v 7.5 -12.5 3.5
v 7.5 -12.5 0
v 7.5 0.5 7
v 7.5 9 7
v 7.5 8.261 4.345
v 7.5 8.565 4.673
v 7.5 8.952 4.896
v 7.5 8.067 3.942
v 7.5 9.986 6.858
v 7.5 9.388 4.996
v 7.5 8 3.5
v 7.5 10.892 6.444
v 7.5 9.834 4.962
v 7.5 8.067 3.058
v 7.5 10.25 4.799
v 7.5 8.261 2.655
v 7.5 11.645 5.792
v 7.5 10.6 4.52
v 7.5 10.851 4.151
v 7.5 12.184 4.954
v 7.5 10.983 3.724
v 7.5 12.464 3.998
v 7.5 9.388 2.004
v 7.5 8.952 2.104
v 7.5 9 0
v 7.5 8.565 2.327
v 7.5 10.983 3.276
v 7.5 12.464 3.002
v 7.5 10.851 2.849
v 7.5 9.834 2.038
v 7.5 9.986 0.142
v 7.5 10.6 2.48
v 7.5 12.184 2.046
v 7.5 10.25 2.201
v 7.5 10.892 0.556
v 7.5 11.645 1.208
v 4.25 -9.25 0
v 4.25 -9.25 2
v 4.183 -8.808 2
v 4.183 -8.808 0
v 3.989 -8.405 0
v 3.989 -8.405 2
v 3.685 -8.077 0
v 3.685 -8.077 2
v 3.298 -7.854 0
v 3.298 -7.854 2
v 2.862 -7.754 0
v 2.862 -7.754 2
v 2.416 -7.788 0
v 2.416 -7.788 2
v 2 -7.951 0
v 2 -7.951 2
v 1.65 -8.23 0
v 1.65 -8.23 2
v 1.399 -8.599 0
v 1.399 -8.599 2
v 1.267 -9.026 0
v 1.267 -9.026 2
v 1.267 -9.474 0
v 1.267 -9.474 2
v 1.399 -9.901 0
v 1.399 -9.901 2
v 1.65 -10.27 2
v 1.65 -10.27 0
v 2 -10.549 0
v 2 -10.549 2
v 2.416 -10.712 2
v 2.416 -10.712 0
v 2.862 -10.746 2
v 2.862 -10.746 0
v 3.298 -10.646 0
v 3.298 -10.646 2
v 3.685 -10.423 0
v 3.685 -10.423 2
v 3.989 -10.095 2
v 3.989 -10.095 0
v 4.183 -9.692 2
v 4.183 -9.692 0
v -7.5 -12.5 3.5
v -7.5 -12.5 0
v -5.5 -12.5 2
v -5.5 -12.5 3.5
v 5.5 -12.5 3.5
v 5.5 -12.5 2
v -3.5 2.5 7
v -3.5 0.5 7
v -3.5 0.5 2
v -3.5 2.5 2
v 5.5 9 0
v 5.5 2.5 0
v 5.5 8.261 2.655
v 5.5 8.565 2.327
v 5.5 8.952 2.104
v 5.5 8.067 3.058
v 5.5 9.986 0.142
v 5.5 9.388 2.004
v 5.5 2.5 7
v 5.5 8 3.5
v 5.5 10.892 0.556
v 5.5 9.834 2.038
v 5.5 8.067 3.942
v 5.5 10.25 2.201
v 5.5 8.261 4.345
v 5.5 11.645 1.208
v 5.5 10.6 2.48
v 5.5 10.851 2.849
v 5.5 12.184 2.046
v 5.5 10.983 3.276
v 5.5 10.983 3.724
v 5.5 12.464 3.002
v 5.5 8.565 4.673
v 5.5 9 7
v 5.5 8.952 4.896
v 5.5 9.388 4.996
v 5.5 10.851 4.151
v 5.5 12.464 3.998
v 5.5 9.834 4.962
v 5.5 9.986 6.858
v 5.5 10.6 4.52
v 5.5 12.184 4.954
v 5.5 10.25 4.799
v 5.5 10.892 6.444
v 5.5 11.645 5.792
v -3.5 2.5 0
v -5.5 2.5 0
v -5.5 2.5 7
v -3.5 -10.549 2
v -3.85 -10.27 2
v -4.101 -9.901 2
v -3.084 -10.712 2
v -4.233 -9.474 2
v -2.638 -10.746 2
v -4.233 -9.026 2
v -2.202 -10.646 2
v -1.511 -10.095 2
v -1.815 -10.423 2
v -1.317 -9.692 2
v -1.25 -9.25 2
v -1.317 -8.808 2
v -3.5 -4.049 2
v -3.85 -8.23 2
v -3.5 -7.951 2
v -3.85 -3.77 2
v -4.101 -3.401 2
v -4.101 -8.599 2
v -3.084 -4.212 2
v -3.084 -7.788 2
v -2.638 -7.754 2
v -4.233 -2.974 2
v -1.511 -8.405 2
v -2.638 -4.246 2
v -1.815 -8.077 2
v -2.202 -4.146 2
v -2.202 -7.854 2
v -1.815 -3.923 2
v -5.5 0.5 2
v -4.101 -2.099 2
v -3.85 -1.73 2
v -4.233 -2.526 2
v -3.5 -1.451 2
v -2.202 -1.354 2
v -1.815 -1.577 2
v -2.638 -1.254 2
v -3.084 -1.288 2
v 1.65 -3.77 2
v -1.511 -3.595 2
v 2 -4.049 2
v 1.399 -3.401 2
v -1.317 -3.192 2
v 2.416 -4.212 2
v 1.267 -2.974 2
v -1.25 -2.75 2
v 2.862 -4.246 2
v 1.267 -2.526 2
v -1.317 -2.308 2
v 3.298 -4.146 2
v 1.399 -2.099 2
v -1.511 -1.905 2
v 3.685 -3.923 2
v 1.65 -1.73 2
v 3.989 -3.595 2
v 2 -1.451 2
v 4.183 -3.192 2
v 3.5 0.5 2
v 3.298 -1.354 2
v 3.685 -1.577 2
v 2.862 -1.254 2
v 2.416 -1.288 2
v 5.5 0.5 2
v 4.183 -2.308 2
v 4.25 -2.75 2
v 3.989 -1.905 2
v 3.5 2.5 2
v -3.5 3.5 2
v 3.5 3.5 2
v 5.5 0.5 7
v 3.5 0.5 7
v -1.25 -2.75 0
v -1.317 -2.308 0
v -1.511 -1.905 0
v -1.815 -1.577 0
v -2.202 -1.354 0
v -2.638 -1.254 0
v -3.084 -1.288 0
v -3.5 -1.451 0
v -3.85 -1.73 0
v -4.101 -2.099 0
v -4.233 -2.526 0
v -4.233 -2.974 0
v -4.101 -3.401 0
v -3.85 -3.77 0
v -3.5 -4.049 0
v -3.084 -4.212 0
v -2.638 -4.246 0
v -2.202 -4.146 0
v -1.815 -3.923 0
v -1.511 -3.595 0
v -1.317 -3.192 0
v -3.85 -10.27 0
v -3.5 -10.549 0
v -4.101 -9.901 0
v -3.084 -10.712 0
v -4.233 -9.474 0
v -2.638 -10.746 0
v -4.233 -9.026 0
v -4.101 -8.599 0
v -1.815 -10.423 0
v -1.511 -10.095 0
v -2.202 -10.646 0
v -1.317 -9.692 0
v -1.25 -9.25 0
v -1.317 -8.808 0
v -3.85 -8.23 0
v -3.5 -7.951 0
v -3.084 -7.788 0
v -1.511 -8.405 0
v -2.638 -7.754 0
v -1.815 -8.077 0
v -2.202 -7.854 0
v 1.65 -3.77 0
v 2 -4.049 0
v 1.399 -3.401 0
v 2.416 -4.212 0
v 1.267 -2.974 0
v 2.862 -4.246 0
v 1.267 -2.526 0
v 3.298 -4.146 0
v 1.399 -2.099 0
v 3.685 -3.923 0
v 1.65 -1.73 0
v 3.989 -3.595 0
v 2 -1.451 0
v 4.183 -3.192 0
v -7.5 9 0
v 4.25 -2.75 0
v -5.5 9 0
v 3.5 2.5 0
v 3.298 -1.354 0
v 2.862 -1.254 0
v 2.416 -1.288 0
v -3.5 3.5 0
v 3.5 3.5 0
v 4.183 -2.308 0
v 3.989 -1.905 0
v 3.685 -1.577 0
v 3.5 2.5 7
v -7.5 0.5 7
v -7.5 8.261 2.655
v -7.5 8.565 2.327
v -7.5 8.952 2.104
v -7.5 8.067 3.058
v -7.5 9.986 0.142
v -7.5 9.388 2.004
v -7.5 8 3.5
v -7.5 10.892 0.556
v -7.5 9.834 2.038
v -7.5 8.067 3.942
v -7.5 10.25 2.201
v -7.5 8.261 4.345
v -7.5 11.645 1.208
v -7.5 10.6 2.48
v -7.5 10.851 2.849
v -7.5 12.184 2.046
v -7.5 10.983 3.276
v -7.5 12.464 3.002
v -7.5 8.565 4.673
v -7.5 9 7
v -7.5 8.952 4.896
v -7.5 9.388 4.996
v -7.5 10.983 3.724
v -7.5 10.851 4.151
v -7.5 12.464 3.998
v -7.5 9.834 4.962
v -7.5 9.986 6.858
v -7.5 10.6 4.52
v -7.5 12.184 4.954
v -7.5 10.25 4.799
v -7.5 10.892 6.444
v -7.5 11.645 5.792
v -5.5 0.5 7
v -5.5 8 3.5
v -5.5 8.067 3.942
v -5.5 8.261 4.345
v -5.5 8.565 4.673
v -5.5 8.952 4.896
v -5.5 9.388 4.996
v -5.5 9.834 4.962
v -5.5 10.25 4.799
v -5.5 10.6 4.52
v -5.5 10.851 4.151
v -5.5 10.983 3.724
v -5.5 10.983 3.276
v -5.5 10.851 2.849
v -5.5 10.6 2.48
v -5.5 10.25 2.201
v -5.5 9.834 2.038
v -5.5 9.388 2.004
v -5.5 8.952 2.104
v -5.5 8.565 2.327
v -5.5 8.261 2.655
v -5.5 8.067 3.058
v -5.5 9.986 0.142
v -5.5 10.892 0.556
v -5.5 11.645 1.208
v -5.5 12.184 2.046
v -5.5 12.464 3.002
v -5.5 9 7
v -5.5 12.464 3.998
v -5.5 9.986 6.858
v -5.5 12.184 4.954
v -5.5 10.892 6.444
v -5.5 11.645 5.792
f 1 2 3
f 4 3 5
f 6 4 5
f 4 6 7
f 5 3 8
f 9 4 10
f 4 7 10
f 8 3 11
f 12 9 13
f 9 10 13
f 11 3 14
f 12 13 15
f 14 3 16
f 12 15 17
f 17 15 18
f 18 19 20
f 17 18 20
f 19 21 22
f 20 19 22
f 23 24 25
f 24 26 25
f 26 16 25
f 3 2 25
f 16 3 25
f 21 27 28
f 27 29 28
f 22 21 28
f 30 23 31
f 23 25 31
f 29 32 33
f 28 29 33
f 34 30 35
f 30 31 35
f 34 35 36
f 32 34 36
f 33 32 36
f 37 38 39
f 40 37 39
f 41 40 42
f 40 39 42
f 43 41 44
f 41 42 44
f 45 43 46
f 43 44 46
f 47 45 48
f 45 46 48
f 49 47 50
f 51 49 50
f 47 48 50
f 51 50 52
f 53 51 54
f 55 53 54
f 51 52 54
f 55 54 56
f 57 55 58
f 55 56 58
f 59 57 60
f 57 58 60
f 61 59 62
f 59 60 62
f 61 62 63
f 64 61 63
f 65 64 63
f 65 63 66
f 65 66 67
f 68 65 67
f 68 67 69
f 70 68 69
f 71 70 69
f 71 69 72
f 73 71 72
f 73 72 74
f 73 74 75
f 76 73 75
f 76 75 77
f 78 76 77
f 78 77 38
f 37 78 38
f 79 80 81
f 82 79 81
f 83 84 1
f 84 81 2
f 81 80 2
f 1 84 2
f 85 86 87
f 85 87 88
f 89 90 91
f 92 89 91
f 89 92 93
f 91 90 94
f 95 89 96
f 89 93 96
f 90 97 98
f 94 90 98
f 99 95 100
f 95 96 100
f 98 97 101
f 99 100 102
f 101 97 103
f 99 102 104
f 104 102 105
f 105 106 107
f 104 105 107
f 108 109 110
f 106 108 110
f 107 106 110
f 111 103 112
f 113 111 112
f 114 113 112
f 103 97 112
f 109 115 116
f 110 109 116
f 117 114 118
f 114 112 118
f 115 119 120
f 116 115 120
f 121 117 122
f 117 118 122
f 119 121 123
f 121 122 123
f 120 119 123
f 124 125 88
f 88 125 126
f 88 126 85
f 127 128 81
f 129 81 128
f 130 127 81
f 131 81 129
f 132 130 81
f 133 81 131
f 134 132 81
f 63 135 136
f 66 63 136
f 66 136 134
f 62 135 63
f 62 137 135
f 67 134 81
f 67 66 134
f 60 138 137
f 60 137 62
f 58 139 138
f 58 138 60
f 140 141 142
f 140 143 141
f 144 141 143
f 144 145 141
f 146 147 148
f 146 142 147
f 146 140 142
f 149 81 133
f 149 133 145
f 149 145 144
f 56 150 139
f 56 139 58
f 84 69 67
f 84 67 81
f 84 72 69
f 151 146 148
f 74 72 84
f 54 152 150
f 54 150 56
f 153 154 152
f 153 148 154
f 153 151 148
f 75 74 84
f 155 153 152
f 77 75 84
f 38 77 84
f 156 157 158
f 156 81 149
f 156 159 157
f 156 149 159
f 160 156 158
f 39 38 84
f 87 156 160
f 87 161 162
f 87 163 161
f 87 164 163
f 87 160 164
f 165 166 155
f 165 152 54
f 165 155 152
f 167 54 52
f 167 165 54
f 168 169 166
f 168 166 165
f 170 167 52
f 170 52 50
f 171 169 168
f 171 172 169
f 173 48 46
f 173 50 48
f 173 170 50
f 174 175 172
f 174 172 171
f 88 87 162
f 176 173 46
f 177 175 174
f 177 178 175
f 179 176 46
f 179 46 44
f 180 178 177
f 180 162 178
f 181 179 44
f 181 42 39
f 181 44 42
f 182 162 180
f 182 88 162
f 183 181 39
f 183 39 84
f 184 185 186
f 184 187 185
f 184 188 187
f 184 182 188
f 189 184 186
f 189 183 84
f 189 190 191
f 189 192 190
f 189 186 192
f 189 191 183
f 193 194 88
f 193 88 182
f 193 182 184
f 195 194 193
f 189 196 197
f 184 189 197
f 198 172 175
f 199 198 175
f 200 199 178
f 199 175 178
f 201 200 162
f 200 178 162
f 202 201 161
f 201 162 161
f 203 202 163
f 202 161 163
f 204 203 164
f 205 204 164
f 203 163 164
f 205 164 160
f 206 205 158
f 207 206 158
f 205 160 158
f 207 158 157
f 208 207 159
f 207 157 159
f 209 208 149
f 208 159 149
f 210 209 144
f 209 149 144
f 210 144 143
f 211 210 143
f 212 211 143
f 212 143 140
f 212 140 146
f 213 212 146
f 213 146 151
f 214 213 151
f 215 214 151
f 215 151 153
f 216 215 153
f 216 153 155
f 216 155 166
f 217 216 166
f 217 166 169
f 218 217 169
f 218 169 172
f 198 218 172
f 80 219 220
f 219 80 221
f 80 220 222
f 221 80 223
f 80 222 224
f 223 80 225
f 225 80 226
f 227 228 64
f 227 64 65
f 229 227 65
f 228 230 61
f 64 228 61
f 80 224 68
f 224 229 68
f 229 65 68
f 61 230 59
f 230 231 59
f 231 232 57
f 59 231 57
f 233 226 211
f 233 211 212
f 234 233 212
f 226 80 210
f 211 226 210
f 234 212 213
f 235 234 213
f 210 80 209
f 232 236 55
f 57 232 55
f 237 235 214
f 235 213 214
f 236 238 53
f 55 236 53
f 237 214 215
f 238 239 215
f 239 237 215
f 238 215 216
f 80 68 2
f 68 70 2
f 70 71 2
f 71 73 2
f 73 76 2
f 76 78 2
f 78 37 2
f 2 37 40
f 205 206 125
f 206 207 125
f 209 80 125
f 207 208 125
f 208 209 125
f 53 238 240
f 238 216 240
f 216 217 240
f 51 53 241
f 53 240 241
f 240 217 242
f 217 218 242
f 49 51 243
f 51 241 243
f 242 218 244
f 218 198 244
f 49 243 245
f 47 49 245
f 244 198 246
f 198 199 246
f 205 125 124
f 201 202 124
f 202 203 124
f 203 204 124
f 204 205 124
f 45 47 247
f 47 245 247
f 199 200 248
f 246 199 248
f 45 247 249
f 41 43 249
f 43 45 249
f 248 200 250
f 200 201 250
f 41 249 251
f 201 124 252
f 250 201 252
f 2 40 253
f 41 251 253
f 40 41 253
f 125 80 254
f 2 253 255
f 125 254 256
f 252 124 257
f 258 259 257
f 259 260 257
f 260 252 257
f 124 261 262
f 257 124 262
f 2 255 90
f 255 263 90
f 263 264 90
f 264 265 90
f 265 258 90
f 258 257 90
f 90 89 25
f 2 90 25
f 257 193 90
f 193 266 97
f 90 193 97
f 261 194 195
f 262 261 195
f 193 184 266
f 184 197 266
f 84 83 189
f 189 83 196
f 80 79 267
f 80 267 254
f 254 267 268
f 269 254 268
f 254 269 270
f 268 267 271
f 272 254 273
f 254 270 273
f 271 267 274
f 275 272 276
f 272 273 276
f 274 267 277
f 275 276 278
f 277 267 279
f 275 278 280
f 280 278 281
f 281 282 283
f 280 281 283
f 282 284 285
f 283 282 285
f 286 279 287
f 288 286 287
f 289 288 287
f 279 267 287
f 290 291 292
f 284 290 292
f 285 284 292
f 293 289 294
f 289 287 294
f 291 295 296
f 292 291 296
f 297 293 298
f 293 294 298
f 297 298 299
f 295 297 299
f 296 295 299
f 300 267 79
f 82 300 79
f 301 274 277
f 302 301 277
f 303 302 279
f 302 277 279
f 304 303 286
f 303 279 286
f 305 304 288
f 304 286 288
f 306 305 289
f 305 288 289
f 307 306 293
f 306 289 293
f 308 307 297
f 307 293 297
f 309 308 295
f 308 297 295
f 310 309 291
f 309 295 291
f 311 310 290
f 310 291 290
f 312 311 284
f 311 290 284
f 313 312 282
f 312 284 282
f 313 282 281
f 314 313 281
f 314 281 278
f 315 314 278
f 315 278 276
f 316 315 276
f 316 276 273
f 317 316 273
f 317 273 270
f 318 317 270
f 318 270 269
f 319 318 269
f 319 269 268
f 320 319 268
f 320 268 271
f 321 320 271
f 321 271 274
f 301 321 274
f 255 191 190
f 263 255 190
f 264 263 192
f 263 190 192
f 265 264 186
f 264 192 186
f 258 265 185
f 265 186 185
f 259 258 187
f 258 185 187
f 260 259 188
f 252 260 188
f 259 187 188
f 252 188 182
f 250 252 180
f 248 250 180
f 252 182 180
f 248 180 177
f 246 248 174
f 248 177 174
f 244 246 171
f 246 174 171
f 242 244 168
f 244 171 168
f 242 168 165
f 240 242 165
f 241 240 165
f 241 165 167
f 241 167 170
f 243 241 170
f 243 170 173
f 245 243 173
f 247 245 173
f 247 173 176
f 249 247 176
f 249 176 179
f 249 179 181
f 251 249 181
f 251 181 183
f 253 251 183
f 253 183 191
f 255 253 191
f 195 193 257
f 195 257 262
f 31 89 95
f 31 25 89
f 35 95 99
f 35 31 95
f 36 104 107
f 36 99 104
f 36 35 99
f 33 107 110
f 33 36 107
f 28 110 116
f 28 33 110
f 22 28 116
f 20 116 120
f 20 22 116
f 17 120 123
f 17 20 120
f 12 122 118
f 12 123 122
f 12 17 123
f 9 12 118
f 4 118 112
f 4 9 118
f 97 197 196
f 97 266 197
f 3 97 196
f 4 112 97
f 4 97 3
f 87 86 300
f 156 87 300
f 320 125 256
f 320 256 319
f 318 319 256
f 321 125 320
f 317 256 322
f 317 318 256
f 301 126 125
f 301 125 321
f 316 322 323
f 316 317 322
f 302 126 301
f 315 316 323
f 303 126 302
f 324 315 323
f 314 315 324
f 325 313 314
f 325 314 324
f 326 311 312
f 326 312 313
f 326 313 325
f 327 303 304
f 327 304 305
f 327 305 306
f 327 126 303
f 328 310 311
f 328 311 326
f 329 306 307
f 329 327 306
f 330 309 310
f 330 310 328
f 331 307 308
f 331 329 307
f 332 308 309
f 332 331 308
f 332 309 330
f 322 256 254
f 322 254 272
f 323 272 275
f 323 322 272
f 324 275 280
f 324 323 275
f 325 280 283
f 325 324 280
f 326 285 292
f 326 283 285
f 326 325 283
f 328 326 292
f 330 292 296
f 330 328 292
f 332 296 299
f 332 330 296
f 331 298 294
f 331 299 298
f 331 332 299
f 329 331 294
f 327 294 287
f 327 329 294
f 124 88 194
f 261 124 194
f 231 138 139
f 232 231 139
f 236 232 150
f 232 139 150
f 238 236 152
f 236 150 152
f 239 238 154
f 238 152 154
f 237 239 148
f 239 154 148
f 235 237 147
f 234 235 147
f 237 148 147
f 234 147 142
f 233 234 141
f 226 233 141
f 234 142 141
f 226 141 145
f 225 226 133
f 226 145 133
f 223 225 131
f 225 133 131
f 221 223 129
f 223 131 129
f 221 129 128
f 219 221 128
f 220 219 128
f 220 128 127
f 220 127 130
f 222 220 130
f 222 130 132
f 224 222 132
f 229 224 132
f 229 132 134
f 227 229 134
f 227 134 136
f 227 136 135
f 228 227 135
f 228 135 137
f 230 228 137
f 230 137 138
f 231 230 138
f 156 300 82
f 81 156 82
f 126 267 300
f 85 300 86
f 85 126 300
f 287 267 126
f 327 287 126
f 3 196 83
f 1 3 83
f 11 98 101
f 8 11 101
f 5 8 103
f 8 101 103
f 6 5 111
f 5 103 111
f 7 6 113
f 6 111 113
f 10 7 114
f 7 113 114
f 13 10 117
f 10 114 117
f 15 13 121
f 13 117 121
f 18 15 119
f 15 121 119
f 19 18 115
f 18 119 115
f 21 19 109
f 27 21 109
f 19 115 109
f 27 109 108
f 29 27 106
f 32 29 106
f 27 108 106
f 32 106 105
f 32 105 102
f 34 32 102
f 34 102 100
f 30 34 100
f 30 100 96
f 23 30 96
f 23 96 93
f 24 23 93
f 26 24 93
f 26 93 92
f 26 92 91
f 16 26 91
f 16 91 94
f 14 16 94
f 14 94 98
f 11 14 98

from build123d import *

# Parameters (mm, degrees)
SKETCH_1_W          = 15
SKETCH_1_H          = 25
EXTRUDE_1_DEPTH     = 7
CUT_EXTRUDE_1_DEPTH = 5
SKETCH_3_W          = 2
SKETCH_3_H          = 10
CUT_EXTRUDE_2_DEPTH = 13
SKETCH_4_W          = 2
SKETCH_4_H          = 3
CUT_EXTRUDE_3_DEPTH = 20.345542122
SKETCH_5_W          = 7
SKETCH_5_H          = 6
CUT_EXTRUDE_4_DEPTH = 13
SKETCH_6_R          = 1.5
EXTRUDE_2_DEPTH     = 2
EXTRUDE_START       = 2
SKETCH_7_R          = 1.5
EXTRUDE_3_DEPTH     = 2
CUT_EXTRUDE_5_DEPTH = 21.742468513
SKETCH_9_R          = 1.5
CUT_EXTRUDE_6_DEPTH = 16.411035007
SKETCH_10_W         = 4
SKETCH_10_H         = 10
EXTRUDE_5_DEPTH     = 7
SKETCH_12_W         = 2
SKETCH_12_H         = 10
CUT_EXTRUDE_7_DEPTH = 17.170961629
SKETCH_14_R         = 1.5
CUT_EXTRUDE_9_DEPTH = 21.742468513
FILLET_1_RADIUS     = 3.5
FILLET_1_LENGTH     = 2
FILLET_2_RADIUS     = 3.5
FILLET_2_LENGTH     = 2


with BuildPart() as part:
    # Эскиз1 → Бобышка-Вытянуть1 (new body)
    with BuildSketch(Plane.XY):
        Rectangle(SKETCH_1_W, SKETCH_1_H)
    extrude(amount=EXTRUDE_1_DEPTH)

    # Эскиз2 → Вырез-Вытянуть1 (cut)
    with BuildSketch(Plane.XY.offset(7)):
        Polygon((-3.5, 0.5), (-5.5, 0.5), (-5.5, -12.5), (5.5, -12.5), (5.5, 0.5), (3.5, 0.5), (3.5, 12.5), (-3.5, 12.5), align=None)
    extrude(amount=-CUT_EXTRUDE_1_DEPTH, mode=Mode.SUBTRACT)

    # Эскиз3 → Вырез-Вытянуть2 (cut)
    with BuildSketch(Plane.XY.offset(7)):
        with Locations((-6.5, 7.5)):
            Rectangle(SKETCH_3_W, SKETCH_3_H)
        with Locations((6.5, 7.5)):
            Rectangle(SKETCH_3_W, SKETCH_3_H)
    extrude(amount=-CUT_EXTRUDE_2_DEPTH, mode=Mode.SUBTRACT)

    # Эскиз4 → Вырез-Вытянуть3 (cut, through all)
    with BuildSketch(Plane.ZY.offset(5.5)):
        with Locations((6, 11)):
            Rectangle(SKETCH_4_W, SKETCH_4_H)
        with Locations((1, 11)):
            Rectangle(SKETCH_4_W, SKETCH_4_H)
    extrude(amount=-CUT_EXTRUDE_3_DEPTH, mode=Mode.SUBTRACT)

    # Эскиз5 → Вырез-Вытянуть4 (cut)
    with BuildSketch(Plane.XY.offset(2)):
        with Locations((0, 6.5)):
            Rectangle(SKETCH_5_W, SKETCH_5_H)
    extrude(amount=-CUT_EXTRUDE_4_DEPTH, mode=Mode.SUBTRACT)

    # Эскиз6 → Бобышка-Вытянуть2 (add)
    with BuildSketch(Plane.ZY.offset(5.5)):
        with Locations(Location((3.5, 9.5, 0), (0, 0, 180))):
            Circle(SKETCH_6_R)
    extrude(amount=EXTRUDE_2_DEPTH)

    # Эскиз7 → Бобышка-Вытянуть3 (add)
    with BuildSketch(Plane(origin=(5.5, 0, 0), x_dir=(0, 0, -1), z_dir=(1, 0, 0)).offset(EXTRUDE_START)):
        with Locations((-3.5, 9.5)):
            Circle(SKETCH_7_R)
    extrude(amount=-EXTRUDE_3_DEPTH)

    # Эскиз8 → Вырез-Вытянуть5 (cut, through all)
    with BuildSketch(Plane.ZY.offset(7.5)):
        Polygon((7, 0.5), (3.5, -12.5), (7, -12.5), align=None)
    extrude(amount=-CUT_EXTRUDE_5_DEPTH, mode=Mode.SUBTRACT)

    # Эскиз9 → Вырез-Вытянуть6 (cut, through all)
    with BuildSketch(Plane.XY.offset(2)):
        with Locations((-2.75, -2.75)):
            Circle(SKETCH_9_R)
        with Locations((2.75, -2.75)):
            Circle(SKETCH_9_R)
        with Locations((-2.75, -9.25)):
            Circle(SKETCH_9_R)
        with Locations((2.75, -9.25)):
            Circle(SKETCH_9_R)
    extrude(amount=-CUT_EXTRUDE_6_DEPTH, mode=Mode.SUBTRACT)

    # Эскиз10 → Бобышка-Вытянуть5 (add)
    with BuildSketch(Plane.XY.offset(7)):
        with Locations((-5.5, 7.5)):
            Rectangle(SKETCH_10_W, SKETCH_10_H)
        with Locations((5.5, 7.5)):
            Rectangle(SKETCH_10_W, SKETCH_10_H)
    extrude(amount=-EXTRUDE_5_DEPTH)

    # Эскиз12 → Вырез-Вытянуть7 (cut, through all)
    with BuildSketch(Plane.XY.offset(7)):
        with Locations((4.5, 7.5)):
            Rectangle(SKETCH_12_W, SKETCH_12_H)
        with Locations((-4.5, 7.5)):
            Rectangle(SKETCH_12_W, SKETCH_12_H)
    extrude(amount=-CUT_EXTRUDE_7_DEPTH, mode=Mode.SUBTRACT)

    # Эскиз14 → Вырез-Вытянуть9 (cut, through all)
    with BuildSketch(Plane.ZY.offset(7.5)):
        with Locations(Location((3.5, 9.5, 0), (0, 0, 270))):
            Circle(SKETCH_14_R)
    extrude(amount=-CUT_EXTRUDE_9_DEPTH, mode=Mode.SUBTRACT)

    # Скругление1: full round fillet: the end face becomes a half cylinder, R = half its width
    fillet_1_face = Plane((-6.5, 12.5, 3.5), x_dir=(1, 0, 0), z_dir=(0, 1, 0))  # on the end face: x along it, z out of the body
    fillet_1_slab = fillet_1_face.offset(-FILLET_1_RADIUS / 2) * Box(FILLET_1_LENGTH, 2 * FILLET_1_RADIUS, FILLET_1_RADIUS, mode=Mode.PRIVATE)  # the body's end, R deep
    fillet_1_round = Plane((-6.5, 9, 3.5), x_dir=(0, 1, 0), z_dir=(1, 0, 0)) * Cylinder(FILLET_1_RADIUS, FILLET_1_LENGTH, mode=Mode.PRIVATE)  # its axis R under the face
    add(fillet_1_slab - fillet_1_round, mode=Mode.SUBTRACT)

    # Скругление2: full round fillet: the end face becomes a half cylinder, R = half its width
    fillet_2_face = Plane((6.5, 12.5, 3.5), x_dir=(1, 0, 0), z_dir=(0, 1, 0))  # on the end face: x along it, z out of the body
    fillet_2_slab = fillet_2_face.offset(-FILLET_2_RADIUS / 2) * Box(FILLET_2_LENGTH, 2 * FILLET_2_RADIUS, FILLET_2_RADIUS, mode=Mode.PRIVATE)  # the body's end, R deep
    fillet_2_round = Plane((6.5, 9, 3.5), x_dir=(0, 1, 0), z_dir=(1, 0, 0)) * Cylinder(FILLET_2_RADIUS, FILLET_2_LENGTH, mode=Mode.PRIVATE)  # its axis R under the face
    add(fillet_2_slab - fillet_2_round, mode=Mode.SUBTRACT)


solid = part.part
